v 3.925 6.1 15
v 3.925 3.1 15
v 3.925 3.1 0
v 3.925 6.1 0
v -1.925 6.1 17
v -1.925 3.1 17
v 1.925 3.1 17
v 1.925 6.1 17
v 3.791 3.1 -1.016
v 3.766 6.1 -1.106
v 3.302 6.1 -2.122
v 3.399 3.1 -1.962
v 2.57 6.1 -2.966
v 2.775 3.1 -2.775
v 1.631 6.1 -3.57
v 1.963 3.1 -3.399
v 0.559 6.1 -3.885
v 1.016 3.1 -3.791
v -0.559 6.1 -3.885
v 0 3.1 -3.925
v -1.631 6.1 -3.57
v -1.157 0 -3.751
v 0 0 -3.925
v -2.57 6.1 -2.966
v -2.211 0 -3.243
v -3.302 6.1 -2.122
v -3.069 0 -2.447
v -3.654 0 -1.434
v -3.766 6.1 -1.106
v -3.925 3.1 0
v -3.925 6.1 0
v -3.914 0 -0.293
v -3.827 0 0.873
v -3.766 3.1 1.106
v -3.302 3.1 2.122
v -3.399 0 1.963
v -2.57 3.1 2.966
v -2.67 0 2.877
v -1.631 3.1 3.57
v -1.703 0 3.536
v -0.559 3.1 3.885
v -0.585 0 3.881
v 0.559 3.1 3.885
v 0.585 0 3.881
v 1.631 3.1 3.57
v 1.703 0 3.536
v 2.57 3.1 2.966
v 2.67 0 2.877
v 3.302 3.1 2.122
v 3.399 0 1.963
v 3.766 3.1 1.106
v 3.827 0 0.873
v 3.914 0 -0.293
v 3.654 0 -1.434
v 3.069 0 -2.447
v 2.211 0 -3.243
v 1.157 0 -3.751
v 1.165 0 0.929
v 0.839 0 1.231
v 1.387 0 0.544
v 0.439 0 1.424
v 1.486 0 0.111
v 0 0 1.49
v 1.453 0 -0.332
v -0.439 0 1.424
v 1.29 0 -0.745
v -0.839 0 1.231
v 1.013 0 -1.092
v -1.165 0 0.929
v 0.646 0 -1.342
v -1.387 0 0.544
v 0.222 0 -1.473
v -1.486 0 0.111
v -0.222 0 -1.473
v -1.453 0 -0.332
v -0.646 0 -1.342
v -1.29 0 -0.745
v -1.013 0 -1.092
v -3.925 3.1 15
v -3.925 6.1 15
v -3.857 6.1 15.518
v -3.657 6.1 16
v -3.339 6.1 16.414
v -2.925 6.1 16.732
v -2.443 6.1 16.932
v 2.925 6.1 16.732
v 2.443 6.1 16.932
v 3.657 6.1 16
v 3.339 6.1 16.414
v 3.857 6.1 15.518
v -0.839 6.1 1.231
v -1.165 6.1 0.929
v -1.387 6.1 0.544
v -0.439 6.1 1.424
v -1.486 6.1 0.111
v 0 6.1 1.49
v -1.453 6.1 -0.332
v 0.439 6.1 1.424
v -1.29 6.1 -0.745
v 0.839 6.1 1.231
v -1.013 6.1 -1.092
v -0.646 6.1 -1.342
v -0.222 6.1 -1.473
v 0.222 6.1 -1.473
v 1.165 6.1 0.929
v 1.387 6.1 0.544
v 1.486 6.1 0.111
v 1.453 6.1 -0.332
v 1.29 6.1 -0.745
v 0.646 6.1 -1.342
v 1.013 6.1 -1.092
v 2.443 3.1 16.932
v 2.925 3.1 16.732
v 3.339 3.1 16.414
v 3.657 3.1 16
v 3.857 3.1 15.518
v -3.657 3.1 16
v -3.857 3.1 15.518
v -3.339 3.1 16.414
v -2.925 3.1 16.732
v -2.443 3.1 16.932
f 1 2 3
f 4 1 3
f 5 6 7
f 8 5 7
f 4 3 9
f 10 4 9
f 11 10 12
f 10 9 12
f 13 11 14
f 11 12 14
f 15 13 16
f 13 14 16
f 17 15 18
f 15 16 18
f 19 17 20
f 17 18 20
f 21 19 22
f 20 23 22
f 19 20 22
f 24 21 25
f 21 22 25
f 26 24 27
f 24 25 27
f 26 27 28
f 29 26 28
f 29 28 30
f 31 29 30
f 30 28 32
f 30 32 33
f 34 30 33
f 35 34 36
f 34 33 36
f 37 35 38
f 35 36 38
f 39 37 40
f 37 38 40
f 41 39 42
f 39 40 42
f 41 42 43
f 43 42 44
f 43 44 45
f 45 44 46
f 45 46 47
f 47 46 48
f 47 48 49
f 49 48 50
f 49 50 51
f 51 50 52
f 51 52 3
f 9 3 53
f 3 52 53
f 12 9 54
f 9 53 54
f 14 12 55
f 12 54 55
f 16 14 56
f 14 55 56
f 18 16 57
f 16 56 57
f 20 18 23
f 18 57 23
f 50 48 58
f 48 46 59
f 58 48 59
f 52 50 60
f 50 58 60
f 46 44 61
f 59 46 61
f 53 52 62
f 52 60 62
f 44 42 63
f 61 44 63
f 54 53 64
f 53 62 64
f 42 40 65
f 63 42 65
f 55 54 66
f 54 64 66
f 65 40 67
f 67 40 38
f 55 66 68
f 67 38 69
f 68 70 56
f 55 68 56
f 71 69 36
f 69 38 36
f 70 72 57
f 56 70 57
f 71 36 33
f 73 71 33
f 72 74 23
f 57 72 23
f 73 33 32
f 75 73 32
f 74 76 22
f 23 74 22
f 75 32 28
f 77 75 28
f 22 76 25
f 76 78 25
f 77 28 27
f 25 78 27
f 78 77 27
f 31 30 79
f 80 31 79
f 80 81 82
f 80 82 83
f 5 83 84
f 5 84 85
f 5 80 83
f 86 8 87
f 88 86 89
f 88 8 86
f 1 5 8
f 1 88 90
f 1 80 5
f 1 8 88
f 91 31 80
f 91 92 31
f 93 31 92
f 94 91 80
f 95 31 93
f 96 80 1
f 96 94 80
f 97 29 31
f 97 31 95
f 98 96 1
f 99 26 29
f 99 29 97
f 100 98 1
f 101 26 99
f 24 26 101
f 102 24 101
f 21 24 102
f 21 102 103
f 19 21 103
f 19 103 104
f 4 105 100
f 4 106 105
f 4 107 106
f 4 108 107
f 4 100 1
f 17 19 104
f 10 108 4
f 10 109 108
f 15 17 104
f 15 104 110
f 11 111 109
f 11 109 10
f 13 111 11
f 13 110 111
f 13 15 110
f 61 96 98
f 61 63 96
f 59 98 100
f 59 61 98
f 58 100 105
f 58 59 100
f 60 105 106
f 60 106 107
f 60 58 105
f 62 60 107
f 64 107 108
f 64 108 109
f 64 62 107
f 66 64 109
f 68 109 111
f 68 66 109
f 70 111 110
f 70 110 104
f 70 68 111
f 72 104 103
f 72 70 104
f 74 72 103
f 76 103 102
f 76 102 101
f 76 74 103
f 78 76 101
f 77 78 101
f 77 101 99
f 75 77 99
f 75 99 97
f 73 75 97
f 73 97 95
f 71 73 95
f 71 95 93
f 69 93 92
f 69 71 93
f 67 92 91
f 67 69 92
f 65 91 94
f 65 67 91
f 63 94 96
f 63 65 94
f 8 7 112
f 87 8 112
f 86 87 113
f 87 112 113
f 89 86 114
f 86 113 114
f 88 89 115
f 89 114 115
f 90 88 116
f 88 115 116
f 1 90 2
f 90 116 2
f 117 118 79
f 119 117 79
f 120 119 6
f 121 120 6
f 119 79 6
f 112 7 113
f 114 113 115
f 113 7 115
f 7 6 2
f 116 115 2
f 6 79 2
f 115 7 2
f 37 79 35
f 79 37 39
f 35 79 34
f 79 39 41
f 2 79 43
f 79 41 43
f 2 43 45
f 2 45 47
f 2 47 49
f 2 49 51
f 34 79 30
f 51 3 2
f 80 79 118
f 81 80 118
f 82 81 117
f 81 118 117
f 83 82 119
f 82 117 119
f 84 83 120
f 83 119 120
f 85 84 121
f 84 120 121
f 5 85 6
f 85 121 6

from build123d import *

# Parameters (mm, degrees)
SKETCH1_R           = 3.925
BOSS_EXTRUDE1_DEPTH = 3.1
SKETCH2_R           = 1.49
CUT_EXTRUDE1_DEPTH  = 3.1
SKETCH3_R           = 1.49
BOSS_EXTRUDE2_DEPTH = 3


with BuildPart() as part:
    # Sketch1 → Boss-Extrude1 (new body)
    with BuildSketch(Plane(origin=(0, 0, 0), x_dir=(1, 0, 0), z_dir=(0, 1, 0))):
        with Locations(Location((0, 0, 0), (0, 0, 90))):
            Circle(SKETCH1_R)
    extrude(amount=BOSS_EXTRUDE1_DEPTH)

    # Sketch2 → Cut-Extrude1 (cut)
    with BuildSketch(Plane(origin=(0, 3.1, 0), x_dir=(1, 0, 0), z_dir=(0, 1, 0))):
        with Locations(Location((0, 0, 0), (0, 0, 270))):
            Circle(SKETCH2_R)
    extrude(amount=-CUT_EXTRUDE1_DEPTH, mode=Mode.SUBTRACT)

    # Sketch3 → Boss-Extrude2 (add)
    with BuildSketch(Plane(origin=(0, 3.1, 0), x_dir=(1, 0, 0), z_dir=(0, 1, 0))):
        with BuildLine():
            Line((-3.925, 0), (-3.925, -15))
            ThreePointArc((-3.925, -15), (-3.339213562, -16.414213562), (-1.925, -17))
            Line((-1.925, -17), (1.925, -17))
            ThreePointArc((1.925, -17), (3.339213562, -16.414213562), (3.925, -15))
            Line((3.925, -15), (3.925, 0))
            ThreePointArc((3.925, 0), (0, 3.925), (-3.925, 0))
        make_face()
        with Locations(Location((0, 0, 0), (0, 0, 270))):
            Circle(SKETCH3_R, mode=Mode.SUBTRACT)
    extrude(amount=BOSS_EXTRUDE2_DEPTH)


solid = part.part
